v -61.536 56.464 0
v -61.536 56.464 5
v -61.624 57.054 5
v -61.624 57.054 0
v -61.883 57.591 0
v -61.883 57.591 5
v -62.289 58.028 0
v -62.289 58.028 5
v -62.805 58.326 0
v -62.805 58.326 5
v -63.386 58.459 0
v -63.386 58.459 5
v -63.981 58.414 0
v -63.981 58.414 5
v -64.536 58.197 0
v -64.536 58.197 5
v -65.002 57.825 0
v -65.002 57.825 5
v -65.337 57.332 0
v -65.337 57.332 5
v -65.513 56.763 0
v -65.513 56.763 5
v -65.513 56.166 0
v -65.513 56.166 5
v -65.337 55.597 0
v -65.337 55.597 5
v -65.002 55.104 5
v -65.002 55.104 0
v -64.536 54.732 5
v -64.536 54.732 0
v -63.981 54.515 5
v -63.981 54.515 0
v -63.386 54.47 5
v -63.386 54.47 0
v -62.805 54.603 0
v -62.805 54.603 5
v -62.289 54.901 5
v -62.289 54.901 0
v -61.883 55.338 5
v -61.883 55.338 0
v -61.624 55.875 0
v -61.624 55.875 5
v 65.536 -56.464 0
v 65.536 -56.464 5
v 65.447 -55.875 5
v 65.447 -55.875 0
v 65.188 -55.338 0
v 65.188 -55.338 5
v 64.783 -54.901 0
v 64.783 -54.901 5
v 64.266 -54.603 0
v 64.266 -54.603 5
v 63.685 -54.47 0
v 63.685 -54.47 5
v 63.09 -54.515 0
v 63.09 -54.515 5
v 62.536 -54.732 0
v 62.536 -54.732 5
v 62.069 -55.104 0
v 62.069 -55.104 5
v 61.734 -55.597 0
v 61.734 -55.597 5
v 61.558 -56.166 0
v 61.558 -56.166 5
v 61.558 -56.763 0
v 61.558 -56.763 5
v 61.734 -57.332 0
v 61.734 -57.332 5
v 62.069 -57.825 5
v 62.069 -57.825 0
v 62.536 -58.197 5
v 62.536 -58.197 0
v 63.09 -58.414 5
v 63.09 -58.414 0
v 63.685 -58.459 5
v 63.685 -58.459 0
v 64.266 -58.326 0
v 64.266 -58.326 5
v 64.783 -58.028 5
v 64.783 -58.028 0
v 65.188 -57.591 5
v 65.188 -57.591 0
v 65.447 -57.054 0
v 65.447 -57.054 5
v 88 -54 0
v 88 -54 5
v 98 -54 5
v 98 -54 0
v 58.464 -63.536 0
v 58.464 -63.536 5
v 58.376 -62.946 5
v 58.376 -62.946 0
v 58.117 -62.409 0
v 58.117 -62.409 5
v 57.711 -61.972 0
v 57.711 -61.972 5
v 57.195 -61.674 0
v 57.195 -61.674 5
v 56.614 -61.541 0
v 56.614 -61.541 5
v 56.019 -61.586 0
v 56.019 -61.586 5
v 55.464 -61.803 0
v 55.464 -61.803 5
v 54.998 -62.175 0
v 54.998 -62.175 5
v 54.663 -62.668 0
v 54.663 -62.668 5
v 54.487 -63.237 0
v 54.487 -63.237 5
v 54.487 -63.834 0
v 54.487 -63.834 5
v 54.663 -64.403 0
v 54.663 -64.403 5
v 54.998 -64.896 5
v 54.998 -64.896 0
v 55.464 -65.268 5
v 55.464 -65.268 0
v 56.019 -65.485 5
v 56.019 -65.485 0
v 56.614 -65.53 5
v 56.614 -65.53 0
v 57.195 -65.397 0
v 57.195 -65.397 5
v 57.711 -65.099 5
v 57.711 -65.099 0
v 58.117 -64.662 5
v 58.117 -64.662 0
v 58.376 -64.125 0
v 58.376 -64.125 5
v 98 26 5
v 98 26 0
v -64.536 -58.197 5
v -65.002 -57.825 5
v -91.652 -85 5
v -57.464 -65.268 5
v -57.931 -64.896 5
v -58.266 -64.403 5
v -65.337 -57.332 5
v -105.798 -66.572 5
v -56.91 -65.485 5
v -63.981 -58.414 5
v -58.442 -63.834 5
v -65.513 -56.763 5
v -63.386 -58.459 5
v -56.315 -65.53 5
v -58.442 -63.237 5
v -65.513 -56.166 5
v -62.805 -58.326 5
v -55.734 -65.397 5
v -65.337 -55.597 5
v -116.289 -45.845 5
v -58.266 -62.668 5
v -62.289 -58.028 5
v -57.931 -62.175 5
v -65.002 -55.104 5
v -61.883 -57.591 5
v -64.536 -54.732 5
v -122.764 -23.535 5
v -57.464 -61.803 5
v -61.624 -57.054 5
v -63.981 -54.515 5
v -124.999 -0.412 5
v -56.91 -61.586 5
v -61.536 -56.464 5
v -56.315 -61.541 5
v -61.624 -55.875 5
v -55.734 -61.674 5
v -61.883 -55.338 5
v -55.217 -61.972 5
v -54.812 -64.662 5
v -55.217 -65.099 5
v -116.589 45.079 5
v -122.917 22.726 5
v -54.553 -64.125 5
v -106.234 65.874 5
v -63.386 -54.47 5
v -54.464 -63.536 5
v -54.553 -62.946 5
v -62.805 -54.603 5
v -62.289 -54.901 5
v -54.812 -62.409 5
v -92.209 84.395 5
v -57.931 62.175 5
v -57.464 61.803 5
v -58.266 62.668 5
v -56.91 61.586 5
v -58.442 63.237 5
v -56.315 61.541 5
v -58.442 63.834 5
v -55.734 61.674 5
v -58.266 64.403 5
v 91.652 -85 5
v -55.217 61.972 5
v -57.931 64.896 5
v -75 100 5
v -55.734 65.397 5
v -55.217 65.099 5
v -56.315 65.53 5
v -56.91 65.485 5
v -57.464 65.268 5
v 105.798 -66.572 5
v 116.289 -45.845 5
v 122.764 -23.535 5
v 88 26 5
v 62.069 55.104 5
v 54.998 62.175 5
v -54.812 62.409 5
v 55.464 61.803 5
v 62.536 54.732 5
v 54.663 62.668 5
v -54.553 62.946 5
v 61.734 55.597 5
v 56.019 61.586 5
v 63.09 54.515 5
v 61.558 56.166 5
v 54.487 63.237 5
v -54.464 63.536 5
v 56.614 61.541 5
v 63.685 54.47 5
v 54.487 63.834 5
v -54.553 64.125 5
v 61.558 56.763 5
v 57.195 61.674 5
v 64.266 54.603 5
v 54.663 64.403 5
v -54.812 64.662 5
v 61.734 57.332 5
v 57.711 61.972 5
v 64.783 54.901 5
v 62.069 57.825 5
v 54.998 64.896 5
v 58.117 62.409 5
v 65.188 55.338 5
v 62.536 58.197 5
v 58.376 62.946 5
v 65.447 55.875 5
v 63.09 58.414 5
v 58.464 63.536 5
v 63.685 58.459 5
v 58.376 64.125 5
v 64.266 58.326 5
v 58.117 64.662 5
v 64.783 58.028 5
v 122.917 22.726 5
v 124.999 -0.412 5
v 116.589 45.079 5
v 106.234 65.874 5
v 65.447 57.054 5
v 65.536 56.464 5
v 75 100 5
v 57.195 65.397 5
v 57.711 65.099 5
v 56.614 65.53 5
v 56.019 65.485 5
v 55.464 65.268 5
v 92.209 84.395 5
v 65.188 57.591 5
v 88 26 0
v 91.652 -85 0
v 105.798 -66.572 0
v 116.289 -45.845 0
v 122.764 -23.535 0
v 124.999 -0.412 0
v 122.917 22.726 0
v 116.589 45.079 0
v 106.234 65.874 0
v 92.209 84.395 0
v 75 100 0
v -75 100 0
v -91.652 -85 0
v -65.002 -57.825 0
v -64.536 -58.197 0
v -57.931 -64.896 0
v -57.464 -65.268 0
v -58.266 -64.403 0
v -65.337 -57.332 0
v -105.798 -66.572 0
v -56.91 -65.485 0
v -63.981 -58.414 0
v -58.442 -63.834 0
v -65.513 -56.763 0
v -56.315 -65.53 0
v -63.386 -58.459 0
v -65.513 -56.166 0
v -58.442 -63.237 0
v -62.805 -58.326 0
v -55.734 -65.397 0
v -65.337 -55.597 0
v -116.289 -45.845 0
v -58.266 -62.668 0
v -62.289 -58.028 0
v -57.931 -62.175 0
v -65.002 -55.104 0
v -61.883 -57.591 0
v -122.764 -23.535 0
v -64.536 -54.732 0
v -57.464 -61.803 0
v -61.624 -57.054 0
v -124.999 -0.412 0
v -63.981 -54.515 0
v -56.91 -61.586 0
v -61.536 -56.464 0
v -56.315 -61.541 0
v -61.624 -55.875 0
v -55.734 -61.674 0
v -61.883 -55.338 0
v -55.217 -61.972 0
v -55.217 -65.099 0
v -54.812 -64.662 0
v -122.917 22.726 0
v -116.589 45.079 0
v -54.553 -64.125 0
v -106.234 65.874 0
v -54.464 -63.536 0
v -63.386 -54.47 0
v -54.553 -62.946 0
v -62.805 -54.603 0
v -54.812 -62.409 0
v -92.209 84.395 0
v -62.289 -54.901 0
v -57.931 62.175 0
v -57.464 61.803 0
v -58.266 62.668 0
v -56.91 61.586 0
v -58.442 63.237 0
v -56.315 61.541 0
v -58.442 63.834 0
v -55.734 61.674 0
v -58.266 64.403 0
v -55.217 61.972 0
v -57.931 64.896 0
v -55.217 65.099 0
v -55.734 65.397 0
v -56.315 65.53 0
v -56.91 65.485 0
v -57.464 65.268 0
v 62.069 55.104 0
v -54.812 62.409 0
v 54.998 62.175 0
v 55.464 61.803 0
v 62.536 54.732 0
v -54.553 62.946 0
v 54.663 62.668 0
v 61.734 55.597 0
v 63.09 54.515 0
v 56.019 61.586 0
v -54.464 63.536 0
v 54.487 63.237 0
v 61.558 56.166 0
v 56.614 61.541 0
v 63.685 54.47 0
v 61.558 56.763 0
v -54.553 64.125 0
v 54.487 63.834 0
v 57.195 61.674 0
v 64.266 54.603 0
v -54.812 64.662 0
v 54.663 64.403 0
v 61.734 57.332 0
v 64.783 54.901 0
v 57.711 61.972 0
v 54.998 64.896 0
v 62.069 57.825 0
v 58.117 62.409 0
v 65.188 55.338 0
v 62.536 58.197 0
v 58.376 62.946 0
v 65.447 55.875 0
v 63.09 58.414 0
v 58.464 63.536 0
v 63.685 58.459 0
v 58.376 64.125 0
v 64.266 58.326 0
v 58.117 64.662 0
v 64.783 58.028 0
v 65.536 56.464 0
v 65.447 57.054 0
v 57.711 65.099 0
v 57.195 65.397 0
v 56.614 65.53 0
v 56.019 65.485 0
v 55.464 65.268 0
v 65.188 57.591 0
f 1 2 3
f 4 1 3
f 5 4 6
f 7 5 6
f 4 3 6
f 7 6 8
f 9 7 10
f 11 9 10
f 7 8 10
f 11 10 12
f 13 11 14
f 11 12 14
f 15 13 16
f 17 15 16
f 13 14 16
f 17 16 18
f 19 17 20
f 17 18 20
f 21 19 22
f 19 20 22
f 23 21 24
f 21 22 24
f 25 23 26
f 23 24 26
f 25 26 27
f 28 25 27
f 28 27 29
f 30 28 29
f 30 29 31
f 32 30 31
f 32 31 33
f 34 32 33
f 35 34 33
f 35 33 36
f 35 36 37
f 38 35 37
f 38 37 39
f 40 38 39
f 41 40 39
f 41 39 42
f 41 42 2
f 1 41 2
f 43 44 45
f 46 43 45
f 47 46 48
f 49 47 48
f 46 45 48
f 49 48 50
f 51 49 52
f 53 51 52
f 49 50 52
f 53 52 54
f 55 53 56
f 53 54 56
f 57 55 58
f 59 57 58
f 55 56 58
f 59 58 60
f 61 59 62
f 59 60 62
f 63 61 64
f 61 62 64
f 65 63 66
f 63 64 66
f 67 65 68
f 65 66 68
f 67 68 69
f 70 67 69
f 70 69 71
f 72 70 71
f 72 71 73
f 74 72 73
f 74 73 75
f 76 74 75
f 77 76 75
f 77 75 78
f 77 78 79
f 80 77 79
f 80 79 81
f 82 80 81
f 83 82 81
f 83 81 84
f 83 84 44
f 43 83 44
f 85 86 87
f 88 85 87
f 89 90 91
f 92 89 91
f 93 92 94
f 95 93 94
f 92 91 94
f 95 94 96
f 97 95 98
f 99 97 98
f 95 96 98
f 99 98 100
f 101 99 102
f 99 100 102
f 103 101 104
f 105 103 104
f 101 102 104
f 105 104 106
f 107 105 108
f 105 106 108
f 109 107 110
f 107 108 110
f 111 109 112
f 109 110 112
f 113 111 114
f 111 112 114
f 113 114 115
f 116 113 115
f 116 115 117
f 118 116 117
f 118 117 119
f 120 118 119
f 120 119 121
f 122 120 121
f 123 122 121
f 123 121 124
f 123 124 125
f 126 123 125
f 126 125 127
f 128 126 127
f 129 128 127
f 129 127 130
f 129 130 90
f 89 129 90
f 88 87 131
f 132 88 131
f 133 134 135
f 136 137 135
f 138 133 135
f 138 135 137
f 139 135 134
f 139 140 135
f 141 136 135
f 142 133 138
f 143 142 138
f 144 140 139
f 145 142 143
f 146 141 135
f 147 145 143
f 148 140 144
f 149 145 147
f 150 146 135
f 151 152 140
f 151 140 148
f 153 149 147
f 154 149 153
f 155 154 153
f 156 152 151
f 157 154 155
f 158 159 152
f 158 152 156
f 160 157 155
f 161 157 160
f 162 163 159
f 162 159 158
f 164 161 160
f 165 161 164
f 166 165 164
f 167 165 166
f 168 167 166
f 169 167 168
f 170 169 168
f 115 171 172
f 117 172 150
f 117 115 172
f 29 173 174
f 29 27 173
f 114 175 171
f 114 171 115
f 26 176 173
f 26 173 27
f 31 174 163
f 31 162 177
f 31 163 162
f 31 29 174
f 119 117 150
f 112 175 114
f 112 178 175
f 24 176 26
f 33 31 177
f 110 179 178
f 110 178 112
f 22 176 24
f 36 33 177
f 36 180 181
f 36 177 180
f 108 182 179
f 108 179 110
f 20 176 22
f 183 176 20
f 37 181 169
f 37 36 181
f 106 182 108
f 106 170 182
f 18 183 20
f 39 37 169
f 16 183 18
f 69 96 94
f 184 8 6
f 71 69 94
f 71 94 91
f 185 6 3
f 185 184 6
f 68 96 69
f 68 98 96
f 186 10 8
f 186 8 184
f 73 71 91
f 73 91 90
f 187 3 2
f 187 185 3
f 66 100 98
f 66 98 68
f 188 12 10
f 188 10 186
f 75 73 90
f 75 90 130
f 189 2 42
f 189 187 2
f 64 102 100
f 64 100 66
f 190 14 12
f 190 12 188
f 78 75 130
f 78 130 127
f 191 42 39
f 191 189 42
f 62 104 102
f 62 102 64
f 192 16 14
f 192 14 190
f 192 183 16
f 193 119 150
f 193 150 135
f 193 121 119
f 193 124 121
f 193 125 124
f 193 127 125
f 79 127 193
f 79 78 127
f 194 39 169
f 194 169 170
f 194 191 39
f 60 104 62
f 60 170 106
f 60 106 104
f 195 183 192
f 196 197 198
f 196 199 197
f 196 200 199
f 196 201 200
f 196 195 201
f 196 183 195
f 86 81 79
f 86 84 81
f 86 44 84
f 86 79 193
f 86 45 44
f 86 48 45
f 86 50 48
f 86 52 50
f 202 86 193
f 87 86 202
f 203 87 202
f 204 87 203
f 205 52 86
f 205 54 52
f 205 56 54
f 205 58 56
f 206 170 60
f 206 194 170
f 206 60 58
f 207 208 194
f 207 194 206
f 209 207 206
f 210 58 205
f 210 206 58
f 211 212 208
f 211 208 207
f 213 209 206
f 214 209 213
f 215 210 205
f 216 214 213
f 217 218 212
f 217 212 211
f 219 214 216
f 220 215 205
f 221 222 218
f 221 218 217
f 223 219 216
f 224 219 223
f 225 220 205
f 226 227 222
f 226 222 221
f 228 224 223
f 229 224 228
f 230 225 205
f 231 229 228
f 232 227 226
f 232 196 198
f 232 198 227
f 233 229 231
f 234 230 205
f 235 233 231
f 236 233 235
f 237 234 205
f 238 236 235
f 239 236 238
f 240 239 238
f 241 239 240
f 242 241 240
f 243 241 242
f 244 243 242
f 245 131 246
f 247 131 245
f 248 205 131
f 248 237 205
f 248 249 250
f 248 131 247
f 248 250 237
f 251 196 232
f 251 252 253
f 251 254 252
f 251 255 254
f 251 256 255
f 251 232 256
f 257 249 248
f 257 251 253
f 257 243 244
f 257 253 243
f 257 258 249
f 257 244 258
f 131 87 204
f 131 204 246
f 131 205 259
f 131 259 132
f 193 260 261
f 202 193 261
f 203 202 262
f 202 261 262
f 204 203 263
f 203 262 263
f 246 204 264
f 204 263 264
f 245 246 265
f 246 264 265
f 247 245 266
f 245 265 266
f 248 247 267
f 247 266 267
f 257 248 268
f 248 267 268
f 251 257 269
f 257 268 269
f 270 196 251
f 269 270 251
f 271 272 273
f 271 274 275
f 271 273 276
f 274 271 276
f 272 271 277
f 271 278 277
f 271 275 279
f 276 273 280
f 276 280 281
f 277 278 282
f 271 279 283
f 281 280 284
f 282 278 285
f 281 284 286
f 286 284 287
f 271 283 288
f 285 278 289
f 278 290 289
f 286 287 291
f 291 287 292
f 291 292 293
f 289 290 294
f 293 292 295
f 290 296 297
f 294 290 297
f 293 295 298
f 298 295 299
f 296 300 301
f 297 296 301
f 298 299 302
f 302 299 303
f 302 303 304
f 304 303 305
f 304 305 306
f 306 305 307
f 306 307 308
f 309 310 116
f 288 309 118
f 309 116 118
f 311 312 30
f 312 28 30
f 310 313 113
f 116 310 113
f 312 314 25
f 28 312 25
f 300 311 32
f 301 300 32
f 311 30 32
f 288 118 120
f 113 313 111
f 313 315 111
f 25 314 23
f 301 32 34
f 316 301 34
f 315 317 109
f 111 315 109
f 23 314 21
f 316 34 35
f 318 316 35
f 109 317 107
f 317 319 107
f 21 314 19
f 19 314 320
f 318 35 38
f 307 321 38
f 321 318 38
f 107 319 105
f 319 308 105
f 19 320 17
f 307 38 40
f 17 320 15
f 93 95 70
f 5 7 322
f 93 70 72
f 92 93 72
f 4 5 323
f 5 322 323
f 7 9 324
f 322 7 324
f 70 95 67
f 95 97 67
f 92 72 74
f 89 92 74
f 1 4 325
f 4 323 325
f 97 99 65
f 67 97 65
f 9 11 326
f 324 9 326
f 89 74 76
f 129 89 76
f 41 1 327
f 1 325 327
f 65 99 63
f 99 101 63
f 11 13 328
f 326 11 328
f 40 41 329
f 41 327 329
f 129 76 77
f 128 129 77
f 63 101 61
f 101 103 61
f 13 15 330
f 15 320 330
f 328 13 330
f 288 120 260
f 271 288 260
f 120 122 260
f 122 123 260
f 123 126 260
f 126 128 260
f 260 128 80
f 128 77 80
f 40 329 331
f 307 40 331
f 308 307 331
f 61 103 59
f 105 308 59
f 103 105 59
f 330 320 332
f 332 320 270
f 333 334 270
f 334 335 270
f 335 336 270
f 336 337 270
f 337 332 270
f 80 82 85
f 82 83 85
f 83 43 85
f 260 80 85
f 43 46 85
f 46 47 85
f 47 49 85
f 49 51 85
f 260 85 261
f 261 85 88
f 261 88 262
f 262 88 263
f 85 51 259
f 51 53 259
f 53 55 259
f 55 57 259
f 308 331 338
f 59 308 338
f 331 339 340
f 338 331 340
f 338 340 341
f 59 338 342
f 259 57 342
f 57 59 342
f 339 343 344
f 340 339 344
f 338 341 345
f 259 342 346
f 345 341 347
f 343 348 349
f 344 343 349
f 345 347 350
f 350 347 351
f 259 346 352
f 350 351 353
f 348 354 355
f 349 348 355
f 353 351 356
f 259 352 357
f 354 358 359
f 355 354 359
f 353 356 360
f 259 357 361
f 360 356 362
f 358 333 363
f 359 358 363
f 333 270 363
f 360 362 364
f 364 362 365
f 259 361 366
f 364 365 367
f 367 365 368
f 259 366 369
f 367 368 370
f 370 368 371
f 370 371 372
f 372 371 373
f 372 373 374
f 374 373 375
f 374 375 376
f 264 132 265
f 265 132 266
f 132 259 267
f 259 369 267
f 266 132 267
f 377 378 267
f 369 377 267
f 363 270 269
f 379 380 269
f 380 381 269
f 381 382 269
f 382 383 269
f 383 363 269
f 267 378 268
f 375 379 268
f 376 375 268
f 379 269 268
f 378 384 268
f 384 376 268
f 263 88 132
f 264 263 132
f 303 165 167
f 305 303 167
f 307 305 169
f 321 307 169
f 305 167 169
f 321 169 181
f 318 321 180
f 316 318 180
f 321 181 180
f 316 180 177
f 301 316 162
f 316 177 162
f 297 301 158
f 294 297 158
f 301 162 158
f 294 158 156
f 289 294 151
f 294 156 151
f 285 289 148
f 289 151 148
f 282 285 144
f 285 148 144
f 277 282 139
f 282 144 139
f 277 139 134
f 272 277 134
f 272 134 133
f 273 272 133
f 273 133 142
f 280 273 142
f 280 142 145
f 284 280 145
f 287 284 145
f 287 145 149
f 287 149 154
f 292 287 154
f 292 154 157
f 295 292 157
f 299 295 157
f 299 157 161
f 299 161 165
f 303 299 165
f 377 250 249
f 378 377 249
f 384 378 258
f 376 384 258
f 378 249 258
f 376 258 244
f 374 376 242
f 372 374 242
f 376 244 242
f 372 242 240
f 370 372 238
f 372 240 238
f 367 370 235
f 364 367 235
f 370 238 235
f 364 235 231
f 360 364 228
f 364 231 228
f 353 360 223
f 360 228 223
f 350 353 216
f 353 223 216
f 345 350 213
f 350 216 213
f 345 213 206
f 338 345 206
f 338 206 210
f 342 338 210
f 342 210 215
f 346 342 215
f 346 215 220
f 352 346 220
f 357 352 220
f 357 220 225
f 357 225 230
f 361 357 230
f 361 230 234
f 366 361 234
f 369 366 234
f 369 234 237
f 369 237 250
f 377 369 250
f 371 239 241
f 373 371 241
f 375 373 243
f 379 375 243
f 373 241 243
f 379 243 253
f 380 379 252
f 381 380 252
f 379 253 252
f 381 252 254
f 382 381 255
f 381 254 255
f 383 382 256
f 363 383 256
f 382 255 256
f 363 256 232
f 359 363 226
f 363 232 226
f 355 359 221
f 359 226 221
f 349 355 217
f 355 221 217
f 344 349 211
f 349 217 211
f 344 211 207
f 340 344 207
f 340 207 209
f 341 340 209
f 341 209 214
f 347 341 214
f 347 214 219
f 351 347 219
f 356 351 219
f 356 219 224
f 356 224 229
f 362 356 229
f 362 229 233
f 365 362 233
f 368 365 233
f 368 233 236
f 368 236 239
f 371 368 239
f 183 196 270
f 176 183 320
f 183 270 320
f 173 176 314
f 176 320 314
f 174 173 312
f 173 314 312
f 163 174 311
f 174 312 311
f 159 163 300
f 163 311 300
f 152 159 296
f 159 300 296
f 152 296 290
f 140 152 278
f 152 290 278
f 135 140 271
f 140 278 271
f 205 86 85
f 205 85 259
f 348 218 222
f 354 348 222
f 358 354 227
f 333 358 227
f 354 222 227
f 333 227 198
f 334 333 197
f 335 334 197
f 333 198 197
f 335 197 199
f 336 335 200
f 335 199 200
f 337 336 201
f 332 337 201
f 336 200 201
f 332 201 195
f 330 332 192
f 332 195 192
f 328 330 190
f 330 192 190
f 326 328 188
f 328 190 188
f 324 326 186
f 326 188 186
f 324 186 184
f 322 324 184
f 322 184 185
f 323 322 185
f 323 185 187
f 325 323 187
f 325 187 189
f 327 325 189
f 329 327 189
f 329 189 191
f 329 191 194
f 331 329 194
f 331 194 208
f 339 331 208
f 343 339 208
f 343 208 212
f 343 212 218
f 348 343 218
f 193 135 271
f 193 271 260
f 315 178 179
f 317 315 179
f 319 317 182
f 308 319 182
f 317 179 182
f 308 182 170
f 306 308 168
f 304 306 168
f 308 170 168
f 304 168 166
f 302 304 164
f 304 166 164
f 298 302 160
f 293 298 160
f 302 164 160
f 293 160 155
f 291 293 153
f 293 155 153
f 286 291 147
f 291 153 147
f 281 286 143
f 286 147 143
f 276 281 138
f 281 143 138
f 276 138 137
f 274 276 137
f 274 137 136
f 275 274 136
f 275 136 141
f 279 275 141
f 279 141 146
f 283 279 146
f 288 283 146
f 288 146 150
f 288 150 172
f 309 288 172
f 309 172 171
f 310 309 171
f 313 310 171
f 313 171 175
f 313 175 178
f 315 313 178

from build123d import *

# Parameters (mm, degrees)
SKETCH1_R           = 125
BOSS_EXTRUDE1_DEPTH = 5
CUT_EXTRUDE1_REACH  = 7
SKETCH2_R           = 2
CUT_EXTRUDE2_REACH  = 7
CUT_EXTRUDE3_REACH  = 7
SKETCH4_W           = 10
SKETCH4_H           = 80
CUT_EXTRUDE4_REACH  = 7


with BuildPart() as part:
    # Sketch1 → Boss-Extrude1 (new body)
    with BuildSketch(Plane.XY):
        Circle(SKETCH1_R)
    extrude(amount=BOSS_EXTRUDE1_DEPTH)

    # Sketch2 → Cut-Extrude1 (cut, up to next)
    with BuildSketch(Plane.XY.offset(5), mode=Mode.PRIVATE) as cut_extrude1_sk1:
        with Locations((-56.464466094, -63.535533906)):
            Circle(SKETCH2_R)
    cut_extrude1_tool1 = extrude(cut_extrude1_sk1.sketch, amount=-CUT_EXTRUDE1_REACH, mode=Mode.PRIVATE) & part.part
    add(cut_extrude1_tool1.solids().sort_by_distance((-56.464466, -63.535534, 5))[0], mode=Mode.SUBTRACT)
    # Sketch2 → Cut-Extrude1 (cut, up to next)
    with BuildSketch(Plane.XY.offset(5), mode=Mode.PRIVATE) as cut_extrude1_sk2:
        with Locations((-63.535533906, -56.464466094)):
            Circle(SKETCH2_R)
    cut_extrude1_tool2 = extrude(cut_extrude1_sk2.sketch, amount=-CUT_EXTRUDE1_REACH, mode=Mode.PRIVATE) & part.part
    add(cut_extrude1_tool2.solids().sort_by_distance((-63.535534, -56.464466, 5))[0], mode=Mode.SUBTRACT)
    # Sketch2 → Cut-Extrude1 (cut, up to next)
    with BuildSketch(Plane.XY.offset(5), mode=Mode.PRIVATE) as cut_extrude1_sk3:
        with Locations((-56.464466094, 63.535533906)):
            Circle(SKETCH2_R)
    cut_extrude1_tool3 = extrude(cut_extrude1_sk3.sketch, amount=-CUT_EXTRUDE1_REACH, mode=Mode.PRIVATE) & part.part
    add(cut_extrude1_tool3.solids().sort_by_distance((-56.464466, 63.535534, 5))[0], mode=Mode.SUBTRACT)
    # Sketch2 → Cut-Extrude1 (cut, up to next)
    with BuildSketch(Plane.XY.offset(5), mode=Mode.PRIVATE) as cut_extrude1_sk4:
        with Locations((-63.535533906, 56.464466094)):
            Circle(SKETCH2_R)
    cut_extrude1_tool4 = extrude(cut_extrude1_sk4.sketch, amount=-CUT_EXTRUDE1_REACH, mode=Mode.PRIVATE) & part.part
    add(cut_extrude1_tool4.solids().sort_by_distance((-63.535534, 56.464466, 5))[0], mode=Mode.SUBTRACT)
    # Sketch2 → Cut-Extrude1 (cut, up to next)
    with BuildSketch(Plane.XY.offset(5), mode=Mode.PRIVATE) as cut_extrude1_sk5:
        with Locations((56.464466094, 63.535533906)):
            Circle(SKETCH2_R)
    cut_extrude1_tool5 = extrude(cut_extrude1_sk5.sketch, amount=-CUT_EXTRUDE1_REACH, mode=Mode.PRIVATE) & part.part
    add(cut_extrude1_tool5.solids().sort_by_distance((56.464466, 63.535534, 5))[0], mode=Mode.SUBTRACT)
    # Sketch2 → Cut-Extrude1 (cut, up to next)
    with BuildSketch(Plane.XY.offset(5), mode=Mode.PRIVATE) as cut_extrude1_sk6:
        with Locations((63.535533906, 56.464466094)):
            Circle(SKETCH2_R)
    cut_extrude1_tool6 = extrude(cut_extrude1_sk6.sketch, amount=-CUT_EXTRUDE1_REACH, mode=Mode.PRIVATE) & part.part
    add(cut_extrude1_tool6.solids().sort_by_distance((63.535534, 56.464466, 5))[0], mode=Mode.SUBTRACT)
    # Sketch2 → Cut-Extrude1 (cut, up to next)
    with BuildSketch(Plane.XY.offset(5), mode=Mode.PRIVATE) as cut_extrude1_sk7:
        with Locations((63.535533906, -56.464466094)):
            Circle(SKETCH2_R)
    cut_extrude1_tool7 = extrude(cut_extrude1_sk7.sketch, amount=-CUT_EXTRUDE1_REACH, mode=Mode.PRIVATE) & part.part
    add(cut_extrude1_tool7.solids().sort_by_distance((63.535534, -56.464466, 5))[0], mode=Mode.SUBTRACT)
    # Sketch2 → Cut-Extrude1 (cut, up to next)
    with BuildSketch(Plane.XY.offset(5), mode=Mode.PRIVATE) as cut_extrude1_sk8:
        with Locations((56.464466094, -63.535533906)):
            Circle(SKETCH2_R)
    cut_extrude1_tool8 = extrude(cut_extrude1_sk8.sketch, amount=-CUT_EXTRUDE1_REACH, mode=Mode.PRIVATE) & part.part
    add(cut_extrude1_tool8.solids().sort_by_distance((56.464466, -63.535534, 5))[0], mode=Mode.SUBTRACT)

    # Sketch3 → Cut-Extrude2 (cut, up to next)
    with BuildSketch(Plane.XY.offset(5), mode=Mode.PRIVATE) as cut_extrude2_sk1:
        with BuildLine():
            Line((-91.651513899, -85), (91.651513899, -85))
            ThreePointArc((91.651513899, -85), (0, -125), (-91.651513899, -85))
        make_face()
    cut_extrude2_tool1 = extrude(cut_extrude2_sk1.sketch, amount=-CUT_EXTRUDE2_REACH, mode=Mode.PRIVATE) & part.part
    add(cut_extrude2_tool1.solids().sort_by_distance((0, -101.241971, 5))[0], mode=Mode.SUBTRACT)

    # Sketch4 → Cut-Extrude3 (cut, up to next)
    with BuildSketch(Plane.XY.offset(5), mode=Mode.PRIVATE) as cut_extrude3_sk1:
        with Locations((93, -14)):
            Rectangle(SKETCH4_W, SKETCH4_H)
    cut_extrude3_tool1 = extrude(cut_extrude3_sk1.sketch, amount=-CUT_EXTRUDE3_REACH, mode=Mode.PRIVATE) & part.part
    add(cut_extrude3_tool1.solids().sort_by_distance((93, -14, 5))[0], mode=Mode.SUBTRACT)

    # Sketch5 → Cut-Extrude4 (cut, up to next)
    with BuildSketch(Plane.XY.offset(5), mode=Mode.PRIVATE) as cut_extrude4_sk1:
        with BuildLine():
            ThreePointArc((75, 100), (0, 125), (-75, 100))
            Line((-75, 100), (75, 100))
        make_face()
    cut_extrude4_tool1 = extrude(cut_extrude4_sk1.sketch, amount=-CUT_EXTRUDE4_REACH, mode=Mode.PRIVATE) & part.part
    add(cut_extrude4_tool1.solids().sort_by_distance((0, 110.090997, 5))[0], mode=Mode.SUBTRACT)


solid = part.part
